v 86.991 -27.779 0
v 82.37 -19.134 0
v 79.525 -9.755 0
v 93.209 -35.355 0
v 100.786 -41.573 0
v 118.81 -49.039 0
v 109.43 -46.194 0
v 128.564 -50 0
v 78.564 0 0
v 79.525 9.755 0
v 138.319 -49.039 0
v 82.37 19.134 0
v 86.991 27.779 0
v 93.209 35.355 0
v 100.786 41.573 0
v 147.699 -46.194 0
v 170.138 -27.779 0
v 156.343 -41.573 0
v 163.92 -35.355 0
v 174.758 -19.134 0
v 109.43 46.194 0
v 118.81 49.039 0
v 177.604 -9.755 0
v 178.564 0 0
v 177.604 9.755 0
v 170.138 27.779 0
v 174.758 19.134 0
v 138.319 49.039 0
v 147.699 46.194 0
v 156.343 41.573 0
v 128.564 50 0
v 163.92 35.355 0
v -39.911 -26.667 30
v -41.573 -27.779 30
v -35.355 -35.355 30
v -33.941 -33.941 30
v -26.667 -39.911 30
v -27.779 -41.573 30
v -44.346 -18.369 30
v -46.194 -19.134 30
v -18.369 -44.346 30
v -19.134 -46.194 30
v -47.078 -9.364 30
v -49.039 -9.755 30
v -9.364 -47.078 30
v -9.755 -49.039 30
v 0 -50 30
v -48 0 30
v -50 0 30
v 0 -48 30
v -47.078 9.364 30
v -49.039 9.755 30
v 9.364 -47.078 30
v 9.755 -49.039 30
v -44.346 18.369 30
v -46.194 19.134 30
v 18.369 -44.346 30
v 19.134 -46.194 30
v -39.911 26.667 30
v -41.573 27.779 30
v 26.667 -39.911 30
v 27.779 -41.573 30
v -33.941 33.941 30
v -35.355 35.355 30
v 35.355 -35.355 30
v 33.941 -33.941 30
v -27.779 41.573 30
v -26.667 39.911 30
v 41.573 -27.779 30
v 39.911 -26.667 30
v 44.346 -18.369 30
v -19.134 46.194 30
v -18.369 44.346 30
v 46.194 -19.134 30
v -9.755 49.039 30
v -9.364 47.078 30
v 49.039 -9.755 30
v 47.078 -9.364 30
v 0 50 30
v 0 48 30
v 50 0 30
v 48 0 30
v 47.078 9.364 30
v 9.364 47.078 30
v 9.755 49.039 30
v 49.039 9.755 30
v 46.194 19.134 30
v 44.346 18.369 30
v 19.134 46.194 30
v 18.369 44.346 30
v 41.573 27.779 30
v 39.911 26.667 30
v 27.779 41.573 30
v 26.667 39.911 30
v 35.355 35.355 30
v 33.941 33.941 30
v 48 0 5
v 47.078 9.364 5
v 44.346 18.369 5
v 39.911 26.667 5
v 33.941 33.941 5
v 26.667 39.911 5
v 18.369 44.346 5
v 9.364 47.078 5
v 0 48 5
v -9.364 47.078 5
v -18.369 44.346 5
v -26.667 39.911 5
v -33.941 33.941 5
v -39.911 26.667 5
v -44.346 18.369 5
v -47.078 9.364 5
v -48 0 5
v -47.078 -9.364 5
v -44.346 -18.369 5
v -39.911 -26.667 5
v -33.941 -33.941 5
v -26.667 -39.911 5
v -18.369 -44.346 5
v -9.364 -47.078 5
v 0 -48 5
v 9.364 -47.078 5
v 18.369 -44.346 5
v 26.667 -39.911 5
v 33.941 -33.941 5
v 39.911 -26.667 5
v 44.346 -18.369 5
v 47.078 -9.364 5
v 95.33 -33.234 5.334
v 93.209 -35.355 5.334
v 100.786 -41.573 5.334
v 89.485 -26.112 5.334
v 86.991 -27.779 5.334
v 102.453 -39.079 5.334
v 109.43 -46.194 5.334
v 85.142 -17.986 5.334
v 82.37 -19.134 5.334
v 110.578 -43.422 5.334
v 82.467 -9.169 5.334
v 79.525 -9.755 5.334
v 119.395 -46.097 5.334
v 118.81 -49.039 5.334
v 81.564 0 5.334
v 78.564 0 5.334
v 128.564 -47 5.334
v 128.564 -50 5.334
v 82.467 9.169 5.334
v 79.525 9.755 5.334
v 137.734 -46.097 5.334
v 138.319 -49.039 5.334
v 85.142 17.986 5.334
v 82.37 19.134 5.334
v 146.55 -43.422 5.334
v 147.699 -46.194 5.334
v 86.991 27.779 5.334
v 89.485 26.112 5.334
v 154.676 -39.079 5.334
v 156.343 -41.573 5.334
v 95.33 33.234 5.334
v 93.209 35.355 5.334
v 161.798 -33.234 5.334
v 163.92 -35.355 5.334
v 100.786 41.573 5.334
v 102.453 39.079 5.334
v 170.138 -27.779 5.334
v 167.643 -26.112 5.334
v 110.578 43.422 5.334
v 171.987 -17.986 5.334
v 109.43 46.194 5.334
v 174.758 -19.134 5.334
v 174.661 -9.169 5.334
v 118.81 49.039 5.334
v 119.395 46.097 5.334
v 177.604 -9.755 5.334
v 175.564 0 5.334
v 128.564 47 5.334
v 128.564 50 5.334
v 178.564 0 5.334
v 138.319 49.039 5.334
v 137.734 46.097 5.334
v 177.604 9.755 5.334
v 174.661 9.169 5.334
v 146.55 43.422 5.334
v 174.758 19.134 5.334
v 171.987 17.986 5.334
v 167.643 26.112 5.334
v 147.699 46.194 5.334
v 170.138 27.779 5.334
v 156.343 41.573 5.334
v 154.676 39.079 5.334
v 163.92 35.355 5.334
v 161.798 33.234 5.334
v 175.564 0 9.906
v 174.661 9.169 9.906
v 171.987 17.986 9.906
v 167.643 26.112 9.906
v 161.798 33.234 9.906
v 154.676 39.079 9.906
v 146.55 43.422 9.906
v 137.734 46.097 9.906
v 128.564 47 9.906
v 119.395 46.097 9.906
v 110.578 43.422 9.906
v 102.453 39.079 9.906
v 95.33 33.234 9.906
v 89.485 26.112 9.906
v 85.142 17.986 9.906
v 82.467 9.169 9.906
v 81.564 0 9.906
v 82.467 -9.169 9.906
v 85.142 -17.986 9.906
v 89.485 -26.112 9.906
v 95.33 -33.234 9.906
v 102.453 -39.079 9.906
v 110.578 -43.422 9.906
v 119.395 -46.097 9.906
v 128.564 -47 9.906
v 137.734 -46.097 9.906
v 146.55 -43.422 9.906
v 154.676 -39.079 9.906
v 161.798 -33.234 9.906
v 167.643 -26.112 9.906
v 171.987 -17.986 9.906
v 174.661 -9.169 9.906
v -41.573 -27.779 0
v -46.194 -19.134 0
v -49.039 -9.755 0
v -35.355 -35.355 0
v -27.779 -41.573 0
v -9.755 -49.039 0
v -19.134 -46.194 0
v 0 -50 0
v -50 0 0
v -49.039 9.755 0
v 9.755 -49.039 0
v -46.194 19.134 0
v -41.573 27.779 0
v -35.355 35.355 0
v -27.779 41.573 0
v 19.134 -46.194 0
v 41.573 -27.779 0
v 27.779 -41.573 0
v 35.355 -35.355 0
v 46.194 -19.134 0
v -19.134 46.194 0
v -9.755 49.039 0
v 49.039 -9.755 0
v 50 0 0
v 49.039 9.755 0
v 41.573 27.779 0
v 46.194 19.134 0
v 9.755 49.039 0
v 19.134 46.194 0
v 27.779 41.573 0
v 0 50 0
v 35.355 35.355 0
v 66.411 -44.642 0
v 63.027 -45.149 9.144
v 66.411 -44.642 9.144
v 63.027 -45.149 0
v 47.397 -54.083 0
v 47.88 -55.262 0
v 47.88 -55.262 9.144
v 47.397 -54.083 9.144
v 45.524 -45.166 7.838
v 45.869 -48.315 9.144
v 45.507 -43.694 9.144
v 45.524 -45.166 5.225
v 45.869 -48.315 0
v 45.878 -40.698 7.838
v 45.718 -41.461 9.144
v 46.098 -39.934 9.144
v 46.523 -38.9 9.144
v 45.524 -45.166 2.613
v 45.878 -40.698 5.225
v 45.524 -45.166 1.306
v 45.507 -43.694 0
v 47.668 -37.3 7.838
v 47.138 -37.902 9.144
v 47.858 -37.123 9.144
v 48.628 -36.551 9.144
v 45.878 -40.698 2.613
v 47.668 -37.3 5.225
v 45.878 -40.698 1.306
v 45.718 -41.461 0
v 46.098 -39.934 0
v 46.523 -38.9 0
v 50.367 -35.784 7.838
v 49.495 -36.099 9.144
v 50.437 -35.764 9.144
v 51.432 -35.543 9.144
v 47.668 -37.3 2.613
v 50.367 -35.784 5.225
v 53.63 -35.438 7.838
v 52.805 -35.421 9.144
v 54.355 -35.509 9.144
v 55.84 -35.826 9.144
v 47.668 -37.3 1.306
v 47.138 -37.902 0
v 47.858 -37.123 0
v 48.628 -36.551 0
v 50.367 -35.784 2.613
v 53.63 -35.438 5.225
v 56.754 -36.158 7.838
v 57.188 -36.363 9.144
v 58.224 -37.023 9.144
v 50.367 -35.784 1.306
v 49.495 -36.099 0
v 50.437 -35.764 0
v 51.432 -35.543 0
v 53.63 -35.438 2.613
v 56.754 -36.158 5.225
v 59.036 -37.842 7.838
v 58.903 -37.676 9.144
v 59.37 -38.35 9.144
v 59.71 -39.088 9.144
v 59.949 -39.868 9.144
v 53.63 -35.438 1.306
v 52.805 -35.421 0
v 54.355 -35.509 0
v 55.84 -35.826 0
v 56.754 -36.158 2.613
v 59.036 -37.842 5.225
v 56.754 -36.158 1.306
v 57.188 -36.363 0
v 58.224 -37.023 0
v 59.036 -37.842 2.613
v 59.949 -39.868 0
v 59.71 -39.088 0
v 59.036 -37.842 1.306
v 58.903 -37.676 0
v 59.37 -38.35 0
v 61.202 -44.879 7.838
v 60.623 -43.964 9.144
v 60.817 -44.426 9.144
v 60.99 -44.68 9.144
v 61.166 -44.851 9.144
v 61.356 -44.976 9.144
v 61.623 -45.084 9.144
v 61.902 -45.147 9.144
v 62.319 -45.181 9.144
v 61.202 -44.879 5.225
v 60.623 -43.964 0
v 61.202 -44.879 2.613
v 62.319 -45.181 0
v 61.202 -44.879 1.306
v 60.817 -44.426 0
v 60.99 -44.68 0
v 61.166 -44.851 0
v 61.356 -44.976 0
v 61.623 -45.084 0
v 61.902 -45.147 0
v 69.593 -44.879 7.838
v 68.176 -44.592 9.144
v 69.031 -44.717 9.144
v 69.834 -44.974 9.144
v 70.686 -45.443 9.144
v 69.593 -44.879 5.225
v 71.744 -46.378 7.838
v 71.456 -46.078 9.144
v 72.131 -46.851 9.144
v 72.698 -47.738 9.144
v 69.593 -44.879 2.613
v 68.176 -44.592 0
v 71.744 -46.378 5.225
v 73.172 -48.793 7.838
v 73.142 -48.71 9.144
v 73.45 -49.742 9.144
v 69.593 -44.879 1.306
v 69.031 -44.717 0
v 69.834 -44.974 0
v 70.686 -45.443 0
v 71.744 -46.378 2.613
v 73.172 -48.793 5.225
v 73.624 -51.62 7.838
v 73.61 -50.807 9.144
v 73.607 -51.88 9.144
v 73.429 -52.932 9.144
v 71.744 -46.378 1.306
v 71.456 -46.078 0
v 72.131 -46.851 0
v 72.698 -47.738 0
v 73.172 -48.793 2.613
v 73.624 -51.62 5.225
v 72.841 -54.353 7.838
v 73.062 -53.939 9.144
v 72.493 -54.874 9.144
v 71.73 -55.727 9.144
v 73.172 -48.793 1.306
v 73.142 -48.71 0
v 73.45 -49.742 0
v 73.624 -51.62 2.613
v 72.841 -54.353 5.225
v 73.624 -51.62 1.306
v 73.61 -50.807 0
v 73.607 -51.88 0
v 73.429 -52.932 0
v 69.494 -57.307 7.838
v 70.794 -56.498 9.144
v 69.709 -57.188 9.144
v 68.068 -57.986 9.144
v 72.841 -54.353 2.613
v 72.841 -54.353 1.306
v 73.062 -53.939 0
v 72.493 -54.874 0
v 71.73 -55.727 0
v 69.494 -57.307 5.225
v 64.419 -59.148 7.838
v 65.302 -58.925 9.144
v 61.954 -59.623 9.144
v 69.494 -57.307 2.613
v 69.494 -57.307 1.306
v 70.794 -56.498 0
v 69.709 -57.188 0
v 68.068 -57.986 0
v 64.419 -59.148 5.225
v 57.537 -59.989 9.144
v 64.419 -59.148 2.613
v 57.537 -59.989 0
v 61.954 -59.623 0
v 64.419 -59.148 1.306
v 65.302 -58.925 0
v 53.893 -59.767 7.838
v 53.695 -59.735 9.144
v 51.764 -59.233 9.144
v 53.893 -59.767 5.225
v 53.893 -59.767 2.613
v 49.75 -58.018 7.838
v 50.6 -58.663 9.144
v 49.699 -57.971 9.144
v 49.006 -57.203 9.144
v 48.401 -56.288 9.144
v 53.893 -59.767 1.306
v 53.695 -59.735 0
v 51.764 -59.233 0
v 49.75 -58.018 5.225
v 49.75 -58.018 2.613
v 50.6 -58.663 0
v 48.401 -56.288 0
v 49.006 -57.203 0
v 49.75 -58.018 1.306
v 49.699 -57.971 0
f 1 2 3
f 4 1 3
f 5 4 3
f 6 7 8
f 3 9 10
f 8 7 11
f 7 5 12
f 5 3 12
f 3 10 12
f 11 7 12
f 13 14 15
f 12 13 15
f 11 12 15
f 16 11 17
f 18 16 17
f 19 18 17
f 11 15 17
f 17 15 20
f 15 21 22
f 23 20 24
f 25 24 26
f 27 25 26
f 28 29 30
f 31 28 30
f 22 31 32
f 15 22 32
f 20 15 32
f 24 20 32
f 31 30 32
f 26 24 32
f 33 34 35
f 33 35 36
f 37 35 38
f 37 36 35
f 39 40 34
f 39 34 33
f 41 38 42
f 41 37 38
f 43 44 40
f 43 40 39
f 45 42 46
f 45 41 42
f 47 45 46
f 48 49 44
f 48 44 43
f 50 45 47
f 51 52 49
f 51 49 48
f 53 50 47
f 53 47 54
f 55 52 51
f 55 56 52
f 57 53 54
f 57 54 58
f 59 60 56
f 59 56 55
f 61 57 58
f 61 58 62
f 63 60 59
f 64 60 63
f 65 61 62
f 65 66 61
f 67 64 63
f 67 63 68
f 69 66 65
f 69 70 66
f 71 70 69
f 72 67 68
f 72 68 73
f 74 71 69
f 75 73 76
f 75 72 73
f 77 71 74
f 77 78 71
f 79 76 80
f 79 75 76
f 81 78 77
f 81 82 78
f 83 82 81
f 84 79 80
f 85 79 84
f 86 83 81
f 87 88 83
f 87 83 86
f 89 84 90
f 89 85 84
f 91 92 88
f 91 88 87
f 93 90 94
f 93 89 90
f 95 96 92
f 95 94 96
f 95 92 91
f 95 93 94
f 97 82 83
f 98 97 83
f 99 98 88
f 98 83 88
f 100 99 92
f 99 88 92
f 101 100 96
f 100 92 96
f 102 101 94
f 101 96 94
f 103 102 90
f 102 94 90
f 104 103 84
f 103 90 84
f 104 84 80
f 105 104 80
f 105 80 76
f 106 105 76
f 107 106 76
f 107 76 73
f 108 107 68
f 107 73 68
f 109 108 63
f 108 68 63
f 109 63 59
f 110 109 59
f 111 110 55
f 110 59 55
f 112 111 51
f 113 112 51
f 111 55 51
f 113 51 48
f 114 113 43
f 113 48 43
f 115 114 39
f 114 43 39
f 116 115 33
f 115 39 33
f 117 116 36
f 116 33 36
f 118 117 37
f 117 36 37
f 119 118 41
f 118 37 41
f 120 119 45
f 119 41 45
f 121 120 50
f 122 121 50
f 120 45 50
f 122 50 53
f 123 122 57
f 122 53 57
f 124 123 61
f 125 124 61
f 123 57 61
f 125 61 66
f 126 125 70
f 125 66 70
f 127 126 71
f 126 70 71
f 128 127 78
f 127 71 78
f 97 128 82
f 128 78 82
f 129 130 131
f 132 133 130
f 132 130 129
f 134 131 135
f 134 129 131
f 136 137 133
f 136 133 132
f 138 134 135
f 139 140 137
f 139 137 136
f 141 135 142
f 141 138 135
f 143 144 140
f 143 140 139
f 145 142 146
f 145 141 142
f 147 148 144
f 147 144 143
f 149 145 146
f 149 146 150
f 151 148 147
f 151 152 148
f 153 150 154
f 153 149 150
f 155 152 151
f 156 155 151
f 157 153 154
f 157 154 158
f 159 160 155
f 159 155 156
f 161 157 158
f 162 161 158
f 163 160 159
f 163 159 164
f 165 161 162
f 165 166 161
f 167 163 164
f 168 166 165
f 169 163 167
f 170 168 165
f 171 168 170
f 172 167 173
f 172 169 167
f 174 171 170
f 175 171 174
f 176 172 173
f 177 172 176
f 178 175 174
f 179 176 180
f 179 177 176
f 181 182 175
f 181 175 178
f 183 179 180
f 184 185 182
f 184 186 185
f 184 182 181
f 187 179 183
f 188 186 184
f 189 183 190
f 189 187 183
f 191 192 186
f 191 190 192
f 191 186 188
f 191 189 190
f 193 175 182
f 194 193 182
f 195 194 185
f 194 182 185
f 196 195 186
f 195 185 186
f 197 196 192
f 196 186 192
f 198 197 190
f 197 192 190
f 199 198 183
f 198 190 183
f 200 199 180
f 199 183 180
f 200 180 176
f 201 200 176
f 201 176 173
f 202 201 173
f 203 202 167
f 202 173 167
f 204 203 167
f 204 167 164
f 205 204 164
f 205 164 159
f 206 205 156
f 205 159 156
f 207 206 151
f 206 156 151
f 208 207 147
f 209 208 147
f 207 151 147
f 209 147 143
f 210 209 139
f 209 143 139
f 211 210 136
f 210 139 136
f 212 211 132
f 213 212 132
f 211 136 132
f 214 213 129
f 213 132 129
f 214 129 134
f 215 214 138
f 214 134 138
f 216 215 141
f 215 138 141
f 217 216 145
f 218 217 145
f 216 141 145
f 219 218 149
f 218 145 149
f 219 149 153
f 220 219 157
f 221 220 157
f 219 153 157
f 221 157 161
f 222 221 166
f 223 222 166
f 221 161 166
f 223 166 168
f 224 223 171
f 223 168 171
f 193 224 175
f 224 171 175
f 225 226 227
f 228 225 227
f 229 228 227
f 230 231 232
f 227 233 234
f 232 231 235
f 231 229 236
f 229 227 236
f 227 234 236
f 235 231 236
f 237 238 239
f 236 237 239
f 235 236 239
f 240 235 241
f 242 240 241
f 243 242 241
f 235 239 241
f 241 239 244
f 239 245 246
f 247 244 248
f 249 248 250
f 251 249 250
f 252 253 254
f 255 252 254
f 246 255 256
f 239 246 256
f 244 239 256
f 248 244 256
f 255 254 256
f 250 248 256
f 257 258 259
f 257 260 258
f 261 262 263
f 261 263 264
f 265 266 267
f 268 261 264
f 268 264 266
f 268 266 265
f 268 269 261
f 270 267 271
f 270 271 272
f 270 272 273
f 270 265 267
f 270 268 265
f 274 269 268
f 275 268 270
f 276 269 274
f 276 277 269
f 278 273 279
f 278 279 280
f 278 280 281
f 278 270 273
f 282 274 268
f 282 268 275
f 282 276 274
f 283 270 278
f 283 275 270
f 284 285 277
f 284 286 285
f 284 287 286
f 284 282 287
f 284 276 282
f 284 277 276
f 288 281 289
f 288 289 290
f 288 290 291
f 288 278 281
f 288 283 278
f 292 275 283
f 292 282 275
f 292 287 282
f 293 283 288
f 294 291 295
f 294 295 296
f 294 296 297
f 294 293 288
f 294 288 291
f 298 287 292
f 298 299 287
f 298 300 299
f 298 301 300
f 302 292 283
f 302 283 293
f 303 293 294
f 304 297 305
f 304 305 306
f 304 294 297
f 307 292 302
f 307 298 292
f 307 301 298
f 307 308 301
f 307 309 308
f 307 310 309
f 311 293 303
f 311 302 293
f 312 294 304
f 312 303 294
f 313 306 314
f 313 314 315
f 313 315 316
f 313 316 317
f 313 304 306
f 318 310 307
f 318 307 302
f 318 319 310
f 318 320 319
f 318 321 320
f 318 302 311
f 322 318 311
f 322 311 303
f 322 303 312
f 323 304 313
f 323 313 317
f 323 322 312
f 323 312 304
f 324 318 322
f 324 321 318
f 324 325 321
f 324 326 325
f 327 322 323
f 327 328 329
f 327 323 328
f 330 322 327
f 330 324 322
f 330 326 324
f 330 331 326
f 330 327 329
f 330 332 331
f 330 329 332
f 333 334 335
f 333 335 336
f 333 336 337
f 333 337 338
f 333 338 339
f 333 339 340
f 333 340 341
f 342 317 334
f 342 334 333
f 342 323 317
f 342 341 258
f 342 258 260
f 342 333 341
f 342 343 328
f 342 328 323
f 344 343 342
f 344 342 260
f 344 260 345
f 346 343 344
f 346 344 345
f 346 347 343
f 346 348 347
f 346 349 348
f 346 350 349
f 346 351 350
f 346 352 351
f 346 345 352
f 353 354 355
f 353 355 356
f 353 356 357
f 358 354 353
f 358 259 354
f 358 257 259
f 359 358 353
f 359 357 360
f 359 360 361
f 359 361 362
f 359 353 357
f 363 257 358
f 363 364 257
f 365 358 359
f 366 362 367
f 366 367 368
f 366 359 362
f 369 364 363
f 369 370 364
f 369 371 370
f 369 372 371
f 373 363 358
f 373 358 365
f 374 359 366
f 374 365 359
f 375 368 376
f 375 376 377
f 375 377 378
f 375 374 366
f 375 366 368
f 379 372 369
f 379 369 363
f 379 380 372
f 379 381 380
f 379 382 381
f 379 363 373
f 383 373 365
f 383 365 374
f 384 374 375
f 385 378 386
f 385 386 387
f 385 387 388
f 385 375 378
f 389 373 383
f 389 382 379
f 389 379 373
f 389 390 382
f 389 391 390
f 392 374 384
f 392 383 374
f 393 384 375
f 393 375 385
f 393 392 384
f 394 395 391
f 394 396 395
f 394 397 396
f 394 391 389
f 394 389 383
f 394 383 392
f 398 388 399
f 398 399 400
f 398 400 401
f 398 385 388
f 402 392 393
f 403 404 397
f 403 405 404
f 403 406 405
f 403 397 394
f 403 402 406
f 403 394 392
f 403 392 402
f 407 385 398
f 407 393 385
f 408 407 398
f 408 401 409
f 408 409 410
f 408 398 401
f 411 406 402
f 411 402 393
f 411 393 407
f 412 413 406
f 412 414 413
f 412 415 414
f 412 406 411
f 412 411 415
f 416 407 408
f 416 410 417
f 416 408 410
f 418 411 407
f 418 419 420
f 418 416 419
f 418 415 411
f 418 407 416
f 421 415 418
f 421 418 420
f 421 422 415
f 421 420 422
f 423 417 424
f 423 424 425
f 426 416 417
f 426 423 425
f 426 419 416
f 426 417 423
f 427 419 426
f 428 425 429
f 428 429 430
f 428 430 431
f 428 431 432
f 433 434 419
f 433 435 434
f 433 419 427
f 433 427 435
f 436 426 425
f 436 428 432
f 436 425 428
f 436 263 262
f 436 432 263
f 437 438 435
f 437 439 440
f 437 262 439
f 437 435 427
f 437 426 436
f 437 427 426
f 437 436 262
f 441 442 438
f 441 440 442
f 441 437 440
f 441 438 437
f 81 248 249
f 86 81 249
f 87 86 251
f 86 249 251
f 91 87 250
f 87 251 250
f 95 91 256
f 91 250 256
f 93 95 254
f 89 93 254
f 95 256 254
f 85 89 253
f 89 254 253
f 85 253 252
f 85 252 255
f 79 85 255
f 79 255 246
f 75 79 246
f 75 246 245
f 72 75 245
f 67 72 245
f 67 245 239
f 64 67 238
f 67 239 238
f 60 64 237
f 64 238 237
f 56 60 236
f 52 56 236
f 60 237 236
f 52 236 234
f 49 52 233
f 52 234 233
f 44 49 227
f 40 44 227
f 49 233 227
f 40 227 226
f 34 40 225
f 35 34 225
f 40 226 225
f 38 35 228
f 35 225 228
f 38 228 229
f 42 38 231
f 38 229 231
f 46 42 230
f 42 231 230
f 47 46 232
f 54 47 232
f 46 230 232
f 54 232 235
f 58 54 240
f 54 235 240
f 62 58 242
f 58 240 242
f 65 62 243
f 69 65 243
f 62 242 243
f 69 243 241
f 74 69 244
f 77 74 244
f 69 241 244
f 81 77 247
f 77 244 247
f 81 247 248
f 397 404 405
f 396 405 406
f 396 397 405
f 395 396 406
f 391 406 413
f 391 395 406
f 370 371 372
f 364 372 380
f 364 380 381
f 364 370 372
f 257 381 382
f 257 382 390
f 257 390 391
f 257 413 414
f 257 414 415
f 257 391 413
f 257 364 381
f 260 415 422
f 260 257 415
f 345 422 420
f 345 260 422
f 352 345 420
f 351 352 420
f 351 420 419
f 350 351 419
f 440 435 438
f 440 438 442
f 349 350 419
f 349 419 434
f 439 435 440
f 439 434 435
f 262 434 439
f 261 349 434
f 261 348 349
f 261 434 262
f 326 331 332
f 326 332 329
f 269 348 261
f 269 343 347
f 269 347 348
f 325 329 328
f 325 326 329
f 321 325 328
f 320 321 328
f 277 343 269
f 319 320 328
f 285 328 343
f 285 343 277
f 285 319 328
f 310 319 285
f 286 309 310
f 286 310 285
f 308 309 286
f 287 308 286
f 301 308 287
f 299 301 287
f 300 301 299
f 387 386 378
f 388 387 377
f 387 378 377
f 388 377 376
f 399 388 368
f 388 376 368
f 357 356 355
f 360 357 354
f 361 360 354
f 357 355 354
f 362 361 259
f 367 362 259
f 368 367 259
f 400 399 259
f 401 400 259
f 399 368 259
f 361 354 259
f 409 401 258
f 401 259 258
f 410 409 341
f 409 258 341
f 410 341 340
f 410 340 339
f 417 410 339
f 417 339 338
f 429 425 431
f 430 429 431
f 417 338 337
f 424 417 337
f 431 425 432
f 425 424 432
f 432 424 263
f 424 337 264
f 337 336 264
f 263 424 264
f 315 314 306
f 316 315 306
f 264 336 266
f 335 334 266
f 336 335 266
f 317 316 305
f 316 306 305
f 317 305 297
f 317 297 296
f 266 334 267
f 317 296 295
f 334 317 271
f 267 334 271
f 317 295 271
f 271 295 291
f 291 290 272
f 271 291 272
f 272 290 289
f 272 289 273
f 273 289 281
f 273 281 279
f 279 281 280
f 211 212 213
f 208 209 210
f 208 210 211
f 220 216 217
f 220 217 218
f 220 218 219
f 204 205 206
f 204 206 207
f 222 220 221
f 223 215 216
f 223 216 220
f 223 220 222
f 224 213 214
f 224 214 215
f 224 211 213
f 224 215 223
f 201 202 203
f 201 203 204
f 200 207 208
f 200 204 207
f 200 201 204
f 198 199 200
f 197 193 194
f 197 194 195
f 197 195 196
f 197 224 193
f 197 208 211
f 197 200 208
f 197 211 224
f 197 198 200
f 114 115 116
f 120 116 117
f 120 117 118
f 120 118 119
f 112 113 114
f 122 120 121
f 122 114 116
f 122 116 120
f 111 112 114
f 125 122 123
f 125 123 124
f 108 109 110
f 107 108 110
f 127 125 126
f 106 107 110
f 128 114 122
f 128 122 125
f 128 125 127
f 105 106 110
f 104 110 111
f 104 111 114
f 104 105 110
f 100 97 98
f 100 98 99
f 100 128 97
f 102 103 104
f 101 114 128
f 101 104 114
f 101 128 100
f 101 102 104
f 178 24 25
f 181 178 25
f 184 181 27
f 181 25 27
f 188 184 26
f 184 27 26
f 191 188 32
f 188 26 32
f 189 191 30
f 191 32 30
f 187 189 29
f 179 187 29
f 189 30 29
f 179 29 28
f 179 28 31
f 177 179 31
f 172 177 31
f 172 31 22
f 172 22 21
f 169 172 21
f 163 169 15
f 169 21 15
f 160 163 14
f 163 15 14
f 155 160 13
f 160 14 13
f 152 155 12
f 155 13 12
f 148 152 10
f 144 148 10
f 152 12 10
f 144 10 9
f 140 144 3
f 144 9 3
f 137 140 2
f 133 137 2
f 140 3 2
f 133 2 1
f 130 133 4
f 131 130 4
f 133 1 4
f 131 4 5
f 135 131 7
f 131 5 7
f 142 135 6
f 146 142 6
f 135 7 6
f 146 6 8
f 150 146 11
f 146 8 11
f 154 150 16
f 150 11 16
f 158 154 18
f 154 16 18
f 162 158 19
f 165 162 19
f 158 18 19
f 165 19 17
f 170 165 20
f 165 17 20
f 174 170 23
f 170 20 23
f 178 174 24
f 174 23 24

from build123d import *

# Parameters (mm, degrees)
F0_R      = 50
F1_DEPTH  = 30
F2_R      = 48
F3_DEPTH  = 25
F4_R      = 50
F5_DEPTH  = 5.334
F6_R      = 47
F7_DEPTH  = 4.572
F10_DEPTH = 9.144


with BuildPart() as f1:
    # F0 (on Top) → F1 (new body)
    with BuildSketch(Plane.XY):
        Circle(F0_R)
    extrude(amount=F1_DEPTH)

    # F2 (on face) → F3 (cut)
    with BuildSketch(Plane.XY.offset(30)):
        Circle(F2_R)
    extrude(amount=-F3_DEPTH, mode=Mode.SUBTRACT)


with BuildPart() as f5:
    # F4 (on Top) → F5 (new body)
    with BuildSketch(Plane.XY):
        with Locations((128.5643698645, 0)):
            Circle(F4_R)
    extrude(amount=F5_DEPTH)

    # F6 (on face) → F7 (join)
    with BuildSketch(Plane.XY.offset(5.334)):
        with Locations((128.5643698645, 0)):
            Circle(F6_R)
    extrude(amount=F7_DEPTH)


with BuildPart() as f10:
    # F8 (on Top) → F10 (new body)
    with BuildSketch(Plane.XY):
        with BuildLine():
            add(Edge.make_bspline(
                [(47.3970100284, -54.0826357901), (45.5771799385, -49.2231335643), (42.9430653457, -33.7869758737), (61.9238546558, -35.442631761), (58.8826161694, -47.9144089127), (71.0037238079, -41.5047722569), (77.6157174697, -57.9473224184), (52.4636281566, -61.6617105691), (48.7020897439, -57.5675972807), (47.3970100284, -54.0826357901)],
                knots=[0, 0, 0, 0, 0.173429919, 0.3162438477, 0.4311141836, 0.5537396811, 0.6877075935, 0.8756258232, 1, 1, 1, 1], degree=3))
        make_face()
    extrude(amount=F10_DEPTH)


solid = Compound([f1.part, f5.part, f10.part])
